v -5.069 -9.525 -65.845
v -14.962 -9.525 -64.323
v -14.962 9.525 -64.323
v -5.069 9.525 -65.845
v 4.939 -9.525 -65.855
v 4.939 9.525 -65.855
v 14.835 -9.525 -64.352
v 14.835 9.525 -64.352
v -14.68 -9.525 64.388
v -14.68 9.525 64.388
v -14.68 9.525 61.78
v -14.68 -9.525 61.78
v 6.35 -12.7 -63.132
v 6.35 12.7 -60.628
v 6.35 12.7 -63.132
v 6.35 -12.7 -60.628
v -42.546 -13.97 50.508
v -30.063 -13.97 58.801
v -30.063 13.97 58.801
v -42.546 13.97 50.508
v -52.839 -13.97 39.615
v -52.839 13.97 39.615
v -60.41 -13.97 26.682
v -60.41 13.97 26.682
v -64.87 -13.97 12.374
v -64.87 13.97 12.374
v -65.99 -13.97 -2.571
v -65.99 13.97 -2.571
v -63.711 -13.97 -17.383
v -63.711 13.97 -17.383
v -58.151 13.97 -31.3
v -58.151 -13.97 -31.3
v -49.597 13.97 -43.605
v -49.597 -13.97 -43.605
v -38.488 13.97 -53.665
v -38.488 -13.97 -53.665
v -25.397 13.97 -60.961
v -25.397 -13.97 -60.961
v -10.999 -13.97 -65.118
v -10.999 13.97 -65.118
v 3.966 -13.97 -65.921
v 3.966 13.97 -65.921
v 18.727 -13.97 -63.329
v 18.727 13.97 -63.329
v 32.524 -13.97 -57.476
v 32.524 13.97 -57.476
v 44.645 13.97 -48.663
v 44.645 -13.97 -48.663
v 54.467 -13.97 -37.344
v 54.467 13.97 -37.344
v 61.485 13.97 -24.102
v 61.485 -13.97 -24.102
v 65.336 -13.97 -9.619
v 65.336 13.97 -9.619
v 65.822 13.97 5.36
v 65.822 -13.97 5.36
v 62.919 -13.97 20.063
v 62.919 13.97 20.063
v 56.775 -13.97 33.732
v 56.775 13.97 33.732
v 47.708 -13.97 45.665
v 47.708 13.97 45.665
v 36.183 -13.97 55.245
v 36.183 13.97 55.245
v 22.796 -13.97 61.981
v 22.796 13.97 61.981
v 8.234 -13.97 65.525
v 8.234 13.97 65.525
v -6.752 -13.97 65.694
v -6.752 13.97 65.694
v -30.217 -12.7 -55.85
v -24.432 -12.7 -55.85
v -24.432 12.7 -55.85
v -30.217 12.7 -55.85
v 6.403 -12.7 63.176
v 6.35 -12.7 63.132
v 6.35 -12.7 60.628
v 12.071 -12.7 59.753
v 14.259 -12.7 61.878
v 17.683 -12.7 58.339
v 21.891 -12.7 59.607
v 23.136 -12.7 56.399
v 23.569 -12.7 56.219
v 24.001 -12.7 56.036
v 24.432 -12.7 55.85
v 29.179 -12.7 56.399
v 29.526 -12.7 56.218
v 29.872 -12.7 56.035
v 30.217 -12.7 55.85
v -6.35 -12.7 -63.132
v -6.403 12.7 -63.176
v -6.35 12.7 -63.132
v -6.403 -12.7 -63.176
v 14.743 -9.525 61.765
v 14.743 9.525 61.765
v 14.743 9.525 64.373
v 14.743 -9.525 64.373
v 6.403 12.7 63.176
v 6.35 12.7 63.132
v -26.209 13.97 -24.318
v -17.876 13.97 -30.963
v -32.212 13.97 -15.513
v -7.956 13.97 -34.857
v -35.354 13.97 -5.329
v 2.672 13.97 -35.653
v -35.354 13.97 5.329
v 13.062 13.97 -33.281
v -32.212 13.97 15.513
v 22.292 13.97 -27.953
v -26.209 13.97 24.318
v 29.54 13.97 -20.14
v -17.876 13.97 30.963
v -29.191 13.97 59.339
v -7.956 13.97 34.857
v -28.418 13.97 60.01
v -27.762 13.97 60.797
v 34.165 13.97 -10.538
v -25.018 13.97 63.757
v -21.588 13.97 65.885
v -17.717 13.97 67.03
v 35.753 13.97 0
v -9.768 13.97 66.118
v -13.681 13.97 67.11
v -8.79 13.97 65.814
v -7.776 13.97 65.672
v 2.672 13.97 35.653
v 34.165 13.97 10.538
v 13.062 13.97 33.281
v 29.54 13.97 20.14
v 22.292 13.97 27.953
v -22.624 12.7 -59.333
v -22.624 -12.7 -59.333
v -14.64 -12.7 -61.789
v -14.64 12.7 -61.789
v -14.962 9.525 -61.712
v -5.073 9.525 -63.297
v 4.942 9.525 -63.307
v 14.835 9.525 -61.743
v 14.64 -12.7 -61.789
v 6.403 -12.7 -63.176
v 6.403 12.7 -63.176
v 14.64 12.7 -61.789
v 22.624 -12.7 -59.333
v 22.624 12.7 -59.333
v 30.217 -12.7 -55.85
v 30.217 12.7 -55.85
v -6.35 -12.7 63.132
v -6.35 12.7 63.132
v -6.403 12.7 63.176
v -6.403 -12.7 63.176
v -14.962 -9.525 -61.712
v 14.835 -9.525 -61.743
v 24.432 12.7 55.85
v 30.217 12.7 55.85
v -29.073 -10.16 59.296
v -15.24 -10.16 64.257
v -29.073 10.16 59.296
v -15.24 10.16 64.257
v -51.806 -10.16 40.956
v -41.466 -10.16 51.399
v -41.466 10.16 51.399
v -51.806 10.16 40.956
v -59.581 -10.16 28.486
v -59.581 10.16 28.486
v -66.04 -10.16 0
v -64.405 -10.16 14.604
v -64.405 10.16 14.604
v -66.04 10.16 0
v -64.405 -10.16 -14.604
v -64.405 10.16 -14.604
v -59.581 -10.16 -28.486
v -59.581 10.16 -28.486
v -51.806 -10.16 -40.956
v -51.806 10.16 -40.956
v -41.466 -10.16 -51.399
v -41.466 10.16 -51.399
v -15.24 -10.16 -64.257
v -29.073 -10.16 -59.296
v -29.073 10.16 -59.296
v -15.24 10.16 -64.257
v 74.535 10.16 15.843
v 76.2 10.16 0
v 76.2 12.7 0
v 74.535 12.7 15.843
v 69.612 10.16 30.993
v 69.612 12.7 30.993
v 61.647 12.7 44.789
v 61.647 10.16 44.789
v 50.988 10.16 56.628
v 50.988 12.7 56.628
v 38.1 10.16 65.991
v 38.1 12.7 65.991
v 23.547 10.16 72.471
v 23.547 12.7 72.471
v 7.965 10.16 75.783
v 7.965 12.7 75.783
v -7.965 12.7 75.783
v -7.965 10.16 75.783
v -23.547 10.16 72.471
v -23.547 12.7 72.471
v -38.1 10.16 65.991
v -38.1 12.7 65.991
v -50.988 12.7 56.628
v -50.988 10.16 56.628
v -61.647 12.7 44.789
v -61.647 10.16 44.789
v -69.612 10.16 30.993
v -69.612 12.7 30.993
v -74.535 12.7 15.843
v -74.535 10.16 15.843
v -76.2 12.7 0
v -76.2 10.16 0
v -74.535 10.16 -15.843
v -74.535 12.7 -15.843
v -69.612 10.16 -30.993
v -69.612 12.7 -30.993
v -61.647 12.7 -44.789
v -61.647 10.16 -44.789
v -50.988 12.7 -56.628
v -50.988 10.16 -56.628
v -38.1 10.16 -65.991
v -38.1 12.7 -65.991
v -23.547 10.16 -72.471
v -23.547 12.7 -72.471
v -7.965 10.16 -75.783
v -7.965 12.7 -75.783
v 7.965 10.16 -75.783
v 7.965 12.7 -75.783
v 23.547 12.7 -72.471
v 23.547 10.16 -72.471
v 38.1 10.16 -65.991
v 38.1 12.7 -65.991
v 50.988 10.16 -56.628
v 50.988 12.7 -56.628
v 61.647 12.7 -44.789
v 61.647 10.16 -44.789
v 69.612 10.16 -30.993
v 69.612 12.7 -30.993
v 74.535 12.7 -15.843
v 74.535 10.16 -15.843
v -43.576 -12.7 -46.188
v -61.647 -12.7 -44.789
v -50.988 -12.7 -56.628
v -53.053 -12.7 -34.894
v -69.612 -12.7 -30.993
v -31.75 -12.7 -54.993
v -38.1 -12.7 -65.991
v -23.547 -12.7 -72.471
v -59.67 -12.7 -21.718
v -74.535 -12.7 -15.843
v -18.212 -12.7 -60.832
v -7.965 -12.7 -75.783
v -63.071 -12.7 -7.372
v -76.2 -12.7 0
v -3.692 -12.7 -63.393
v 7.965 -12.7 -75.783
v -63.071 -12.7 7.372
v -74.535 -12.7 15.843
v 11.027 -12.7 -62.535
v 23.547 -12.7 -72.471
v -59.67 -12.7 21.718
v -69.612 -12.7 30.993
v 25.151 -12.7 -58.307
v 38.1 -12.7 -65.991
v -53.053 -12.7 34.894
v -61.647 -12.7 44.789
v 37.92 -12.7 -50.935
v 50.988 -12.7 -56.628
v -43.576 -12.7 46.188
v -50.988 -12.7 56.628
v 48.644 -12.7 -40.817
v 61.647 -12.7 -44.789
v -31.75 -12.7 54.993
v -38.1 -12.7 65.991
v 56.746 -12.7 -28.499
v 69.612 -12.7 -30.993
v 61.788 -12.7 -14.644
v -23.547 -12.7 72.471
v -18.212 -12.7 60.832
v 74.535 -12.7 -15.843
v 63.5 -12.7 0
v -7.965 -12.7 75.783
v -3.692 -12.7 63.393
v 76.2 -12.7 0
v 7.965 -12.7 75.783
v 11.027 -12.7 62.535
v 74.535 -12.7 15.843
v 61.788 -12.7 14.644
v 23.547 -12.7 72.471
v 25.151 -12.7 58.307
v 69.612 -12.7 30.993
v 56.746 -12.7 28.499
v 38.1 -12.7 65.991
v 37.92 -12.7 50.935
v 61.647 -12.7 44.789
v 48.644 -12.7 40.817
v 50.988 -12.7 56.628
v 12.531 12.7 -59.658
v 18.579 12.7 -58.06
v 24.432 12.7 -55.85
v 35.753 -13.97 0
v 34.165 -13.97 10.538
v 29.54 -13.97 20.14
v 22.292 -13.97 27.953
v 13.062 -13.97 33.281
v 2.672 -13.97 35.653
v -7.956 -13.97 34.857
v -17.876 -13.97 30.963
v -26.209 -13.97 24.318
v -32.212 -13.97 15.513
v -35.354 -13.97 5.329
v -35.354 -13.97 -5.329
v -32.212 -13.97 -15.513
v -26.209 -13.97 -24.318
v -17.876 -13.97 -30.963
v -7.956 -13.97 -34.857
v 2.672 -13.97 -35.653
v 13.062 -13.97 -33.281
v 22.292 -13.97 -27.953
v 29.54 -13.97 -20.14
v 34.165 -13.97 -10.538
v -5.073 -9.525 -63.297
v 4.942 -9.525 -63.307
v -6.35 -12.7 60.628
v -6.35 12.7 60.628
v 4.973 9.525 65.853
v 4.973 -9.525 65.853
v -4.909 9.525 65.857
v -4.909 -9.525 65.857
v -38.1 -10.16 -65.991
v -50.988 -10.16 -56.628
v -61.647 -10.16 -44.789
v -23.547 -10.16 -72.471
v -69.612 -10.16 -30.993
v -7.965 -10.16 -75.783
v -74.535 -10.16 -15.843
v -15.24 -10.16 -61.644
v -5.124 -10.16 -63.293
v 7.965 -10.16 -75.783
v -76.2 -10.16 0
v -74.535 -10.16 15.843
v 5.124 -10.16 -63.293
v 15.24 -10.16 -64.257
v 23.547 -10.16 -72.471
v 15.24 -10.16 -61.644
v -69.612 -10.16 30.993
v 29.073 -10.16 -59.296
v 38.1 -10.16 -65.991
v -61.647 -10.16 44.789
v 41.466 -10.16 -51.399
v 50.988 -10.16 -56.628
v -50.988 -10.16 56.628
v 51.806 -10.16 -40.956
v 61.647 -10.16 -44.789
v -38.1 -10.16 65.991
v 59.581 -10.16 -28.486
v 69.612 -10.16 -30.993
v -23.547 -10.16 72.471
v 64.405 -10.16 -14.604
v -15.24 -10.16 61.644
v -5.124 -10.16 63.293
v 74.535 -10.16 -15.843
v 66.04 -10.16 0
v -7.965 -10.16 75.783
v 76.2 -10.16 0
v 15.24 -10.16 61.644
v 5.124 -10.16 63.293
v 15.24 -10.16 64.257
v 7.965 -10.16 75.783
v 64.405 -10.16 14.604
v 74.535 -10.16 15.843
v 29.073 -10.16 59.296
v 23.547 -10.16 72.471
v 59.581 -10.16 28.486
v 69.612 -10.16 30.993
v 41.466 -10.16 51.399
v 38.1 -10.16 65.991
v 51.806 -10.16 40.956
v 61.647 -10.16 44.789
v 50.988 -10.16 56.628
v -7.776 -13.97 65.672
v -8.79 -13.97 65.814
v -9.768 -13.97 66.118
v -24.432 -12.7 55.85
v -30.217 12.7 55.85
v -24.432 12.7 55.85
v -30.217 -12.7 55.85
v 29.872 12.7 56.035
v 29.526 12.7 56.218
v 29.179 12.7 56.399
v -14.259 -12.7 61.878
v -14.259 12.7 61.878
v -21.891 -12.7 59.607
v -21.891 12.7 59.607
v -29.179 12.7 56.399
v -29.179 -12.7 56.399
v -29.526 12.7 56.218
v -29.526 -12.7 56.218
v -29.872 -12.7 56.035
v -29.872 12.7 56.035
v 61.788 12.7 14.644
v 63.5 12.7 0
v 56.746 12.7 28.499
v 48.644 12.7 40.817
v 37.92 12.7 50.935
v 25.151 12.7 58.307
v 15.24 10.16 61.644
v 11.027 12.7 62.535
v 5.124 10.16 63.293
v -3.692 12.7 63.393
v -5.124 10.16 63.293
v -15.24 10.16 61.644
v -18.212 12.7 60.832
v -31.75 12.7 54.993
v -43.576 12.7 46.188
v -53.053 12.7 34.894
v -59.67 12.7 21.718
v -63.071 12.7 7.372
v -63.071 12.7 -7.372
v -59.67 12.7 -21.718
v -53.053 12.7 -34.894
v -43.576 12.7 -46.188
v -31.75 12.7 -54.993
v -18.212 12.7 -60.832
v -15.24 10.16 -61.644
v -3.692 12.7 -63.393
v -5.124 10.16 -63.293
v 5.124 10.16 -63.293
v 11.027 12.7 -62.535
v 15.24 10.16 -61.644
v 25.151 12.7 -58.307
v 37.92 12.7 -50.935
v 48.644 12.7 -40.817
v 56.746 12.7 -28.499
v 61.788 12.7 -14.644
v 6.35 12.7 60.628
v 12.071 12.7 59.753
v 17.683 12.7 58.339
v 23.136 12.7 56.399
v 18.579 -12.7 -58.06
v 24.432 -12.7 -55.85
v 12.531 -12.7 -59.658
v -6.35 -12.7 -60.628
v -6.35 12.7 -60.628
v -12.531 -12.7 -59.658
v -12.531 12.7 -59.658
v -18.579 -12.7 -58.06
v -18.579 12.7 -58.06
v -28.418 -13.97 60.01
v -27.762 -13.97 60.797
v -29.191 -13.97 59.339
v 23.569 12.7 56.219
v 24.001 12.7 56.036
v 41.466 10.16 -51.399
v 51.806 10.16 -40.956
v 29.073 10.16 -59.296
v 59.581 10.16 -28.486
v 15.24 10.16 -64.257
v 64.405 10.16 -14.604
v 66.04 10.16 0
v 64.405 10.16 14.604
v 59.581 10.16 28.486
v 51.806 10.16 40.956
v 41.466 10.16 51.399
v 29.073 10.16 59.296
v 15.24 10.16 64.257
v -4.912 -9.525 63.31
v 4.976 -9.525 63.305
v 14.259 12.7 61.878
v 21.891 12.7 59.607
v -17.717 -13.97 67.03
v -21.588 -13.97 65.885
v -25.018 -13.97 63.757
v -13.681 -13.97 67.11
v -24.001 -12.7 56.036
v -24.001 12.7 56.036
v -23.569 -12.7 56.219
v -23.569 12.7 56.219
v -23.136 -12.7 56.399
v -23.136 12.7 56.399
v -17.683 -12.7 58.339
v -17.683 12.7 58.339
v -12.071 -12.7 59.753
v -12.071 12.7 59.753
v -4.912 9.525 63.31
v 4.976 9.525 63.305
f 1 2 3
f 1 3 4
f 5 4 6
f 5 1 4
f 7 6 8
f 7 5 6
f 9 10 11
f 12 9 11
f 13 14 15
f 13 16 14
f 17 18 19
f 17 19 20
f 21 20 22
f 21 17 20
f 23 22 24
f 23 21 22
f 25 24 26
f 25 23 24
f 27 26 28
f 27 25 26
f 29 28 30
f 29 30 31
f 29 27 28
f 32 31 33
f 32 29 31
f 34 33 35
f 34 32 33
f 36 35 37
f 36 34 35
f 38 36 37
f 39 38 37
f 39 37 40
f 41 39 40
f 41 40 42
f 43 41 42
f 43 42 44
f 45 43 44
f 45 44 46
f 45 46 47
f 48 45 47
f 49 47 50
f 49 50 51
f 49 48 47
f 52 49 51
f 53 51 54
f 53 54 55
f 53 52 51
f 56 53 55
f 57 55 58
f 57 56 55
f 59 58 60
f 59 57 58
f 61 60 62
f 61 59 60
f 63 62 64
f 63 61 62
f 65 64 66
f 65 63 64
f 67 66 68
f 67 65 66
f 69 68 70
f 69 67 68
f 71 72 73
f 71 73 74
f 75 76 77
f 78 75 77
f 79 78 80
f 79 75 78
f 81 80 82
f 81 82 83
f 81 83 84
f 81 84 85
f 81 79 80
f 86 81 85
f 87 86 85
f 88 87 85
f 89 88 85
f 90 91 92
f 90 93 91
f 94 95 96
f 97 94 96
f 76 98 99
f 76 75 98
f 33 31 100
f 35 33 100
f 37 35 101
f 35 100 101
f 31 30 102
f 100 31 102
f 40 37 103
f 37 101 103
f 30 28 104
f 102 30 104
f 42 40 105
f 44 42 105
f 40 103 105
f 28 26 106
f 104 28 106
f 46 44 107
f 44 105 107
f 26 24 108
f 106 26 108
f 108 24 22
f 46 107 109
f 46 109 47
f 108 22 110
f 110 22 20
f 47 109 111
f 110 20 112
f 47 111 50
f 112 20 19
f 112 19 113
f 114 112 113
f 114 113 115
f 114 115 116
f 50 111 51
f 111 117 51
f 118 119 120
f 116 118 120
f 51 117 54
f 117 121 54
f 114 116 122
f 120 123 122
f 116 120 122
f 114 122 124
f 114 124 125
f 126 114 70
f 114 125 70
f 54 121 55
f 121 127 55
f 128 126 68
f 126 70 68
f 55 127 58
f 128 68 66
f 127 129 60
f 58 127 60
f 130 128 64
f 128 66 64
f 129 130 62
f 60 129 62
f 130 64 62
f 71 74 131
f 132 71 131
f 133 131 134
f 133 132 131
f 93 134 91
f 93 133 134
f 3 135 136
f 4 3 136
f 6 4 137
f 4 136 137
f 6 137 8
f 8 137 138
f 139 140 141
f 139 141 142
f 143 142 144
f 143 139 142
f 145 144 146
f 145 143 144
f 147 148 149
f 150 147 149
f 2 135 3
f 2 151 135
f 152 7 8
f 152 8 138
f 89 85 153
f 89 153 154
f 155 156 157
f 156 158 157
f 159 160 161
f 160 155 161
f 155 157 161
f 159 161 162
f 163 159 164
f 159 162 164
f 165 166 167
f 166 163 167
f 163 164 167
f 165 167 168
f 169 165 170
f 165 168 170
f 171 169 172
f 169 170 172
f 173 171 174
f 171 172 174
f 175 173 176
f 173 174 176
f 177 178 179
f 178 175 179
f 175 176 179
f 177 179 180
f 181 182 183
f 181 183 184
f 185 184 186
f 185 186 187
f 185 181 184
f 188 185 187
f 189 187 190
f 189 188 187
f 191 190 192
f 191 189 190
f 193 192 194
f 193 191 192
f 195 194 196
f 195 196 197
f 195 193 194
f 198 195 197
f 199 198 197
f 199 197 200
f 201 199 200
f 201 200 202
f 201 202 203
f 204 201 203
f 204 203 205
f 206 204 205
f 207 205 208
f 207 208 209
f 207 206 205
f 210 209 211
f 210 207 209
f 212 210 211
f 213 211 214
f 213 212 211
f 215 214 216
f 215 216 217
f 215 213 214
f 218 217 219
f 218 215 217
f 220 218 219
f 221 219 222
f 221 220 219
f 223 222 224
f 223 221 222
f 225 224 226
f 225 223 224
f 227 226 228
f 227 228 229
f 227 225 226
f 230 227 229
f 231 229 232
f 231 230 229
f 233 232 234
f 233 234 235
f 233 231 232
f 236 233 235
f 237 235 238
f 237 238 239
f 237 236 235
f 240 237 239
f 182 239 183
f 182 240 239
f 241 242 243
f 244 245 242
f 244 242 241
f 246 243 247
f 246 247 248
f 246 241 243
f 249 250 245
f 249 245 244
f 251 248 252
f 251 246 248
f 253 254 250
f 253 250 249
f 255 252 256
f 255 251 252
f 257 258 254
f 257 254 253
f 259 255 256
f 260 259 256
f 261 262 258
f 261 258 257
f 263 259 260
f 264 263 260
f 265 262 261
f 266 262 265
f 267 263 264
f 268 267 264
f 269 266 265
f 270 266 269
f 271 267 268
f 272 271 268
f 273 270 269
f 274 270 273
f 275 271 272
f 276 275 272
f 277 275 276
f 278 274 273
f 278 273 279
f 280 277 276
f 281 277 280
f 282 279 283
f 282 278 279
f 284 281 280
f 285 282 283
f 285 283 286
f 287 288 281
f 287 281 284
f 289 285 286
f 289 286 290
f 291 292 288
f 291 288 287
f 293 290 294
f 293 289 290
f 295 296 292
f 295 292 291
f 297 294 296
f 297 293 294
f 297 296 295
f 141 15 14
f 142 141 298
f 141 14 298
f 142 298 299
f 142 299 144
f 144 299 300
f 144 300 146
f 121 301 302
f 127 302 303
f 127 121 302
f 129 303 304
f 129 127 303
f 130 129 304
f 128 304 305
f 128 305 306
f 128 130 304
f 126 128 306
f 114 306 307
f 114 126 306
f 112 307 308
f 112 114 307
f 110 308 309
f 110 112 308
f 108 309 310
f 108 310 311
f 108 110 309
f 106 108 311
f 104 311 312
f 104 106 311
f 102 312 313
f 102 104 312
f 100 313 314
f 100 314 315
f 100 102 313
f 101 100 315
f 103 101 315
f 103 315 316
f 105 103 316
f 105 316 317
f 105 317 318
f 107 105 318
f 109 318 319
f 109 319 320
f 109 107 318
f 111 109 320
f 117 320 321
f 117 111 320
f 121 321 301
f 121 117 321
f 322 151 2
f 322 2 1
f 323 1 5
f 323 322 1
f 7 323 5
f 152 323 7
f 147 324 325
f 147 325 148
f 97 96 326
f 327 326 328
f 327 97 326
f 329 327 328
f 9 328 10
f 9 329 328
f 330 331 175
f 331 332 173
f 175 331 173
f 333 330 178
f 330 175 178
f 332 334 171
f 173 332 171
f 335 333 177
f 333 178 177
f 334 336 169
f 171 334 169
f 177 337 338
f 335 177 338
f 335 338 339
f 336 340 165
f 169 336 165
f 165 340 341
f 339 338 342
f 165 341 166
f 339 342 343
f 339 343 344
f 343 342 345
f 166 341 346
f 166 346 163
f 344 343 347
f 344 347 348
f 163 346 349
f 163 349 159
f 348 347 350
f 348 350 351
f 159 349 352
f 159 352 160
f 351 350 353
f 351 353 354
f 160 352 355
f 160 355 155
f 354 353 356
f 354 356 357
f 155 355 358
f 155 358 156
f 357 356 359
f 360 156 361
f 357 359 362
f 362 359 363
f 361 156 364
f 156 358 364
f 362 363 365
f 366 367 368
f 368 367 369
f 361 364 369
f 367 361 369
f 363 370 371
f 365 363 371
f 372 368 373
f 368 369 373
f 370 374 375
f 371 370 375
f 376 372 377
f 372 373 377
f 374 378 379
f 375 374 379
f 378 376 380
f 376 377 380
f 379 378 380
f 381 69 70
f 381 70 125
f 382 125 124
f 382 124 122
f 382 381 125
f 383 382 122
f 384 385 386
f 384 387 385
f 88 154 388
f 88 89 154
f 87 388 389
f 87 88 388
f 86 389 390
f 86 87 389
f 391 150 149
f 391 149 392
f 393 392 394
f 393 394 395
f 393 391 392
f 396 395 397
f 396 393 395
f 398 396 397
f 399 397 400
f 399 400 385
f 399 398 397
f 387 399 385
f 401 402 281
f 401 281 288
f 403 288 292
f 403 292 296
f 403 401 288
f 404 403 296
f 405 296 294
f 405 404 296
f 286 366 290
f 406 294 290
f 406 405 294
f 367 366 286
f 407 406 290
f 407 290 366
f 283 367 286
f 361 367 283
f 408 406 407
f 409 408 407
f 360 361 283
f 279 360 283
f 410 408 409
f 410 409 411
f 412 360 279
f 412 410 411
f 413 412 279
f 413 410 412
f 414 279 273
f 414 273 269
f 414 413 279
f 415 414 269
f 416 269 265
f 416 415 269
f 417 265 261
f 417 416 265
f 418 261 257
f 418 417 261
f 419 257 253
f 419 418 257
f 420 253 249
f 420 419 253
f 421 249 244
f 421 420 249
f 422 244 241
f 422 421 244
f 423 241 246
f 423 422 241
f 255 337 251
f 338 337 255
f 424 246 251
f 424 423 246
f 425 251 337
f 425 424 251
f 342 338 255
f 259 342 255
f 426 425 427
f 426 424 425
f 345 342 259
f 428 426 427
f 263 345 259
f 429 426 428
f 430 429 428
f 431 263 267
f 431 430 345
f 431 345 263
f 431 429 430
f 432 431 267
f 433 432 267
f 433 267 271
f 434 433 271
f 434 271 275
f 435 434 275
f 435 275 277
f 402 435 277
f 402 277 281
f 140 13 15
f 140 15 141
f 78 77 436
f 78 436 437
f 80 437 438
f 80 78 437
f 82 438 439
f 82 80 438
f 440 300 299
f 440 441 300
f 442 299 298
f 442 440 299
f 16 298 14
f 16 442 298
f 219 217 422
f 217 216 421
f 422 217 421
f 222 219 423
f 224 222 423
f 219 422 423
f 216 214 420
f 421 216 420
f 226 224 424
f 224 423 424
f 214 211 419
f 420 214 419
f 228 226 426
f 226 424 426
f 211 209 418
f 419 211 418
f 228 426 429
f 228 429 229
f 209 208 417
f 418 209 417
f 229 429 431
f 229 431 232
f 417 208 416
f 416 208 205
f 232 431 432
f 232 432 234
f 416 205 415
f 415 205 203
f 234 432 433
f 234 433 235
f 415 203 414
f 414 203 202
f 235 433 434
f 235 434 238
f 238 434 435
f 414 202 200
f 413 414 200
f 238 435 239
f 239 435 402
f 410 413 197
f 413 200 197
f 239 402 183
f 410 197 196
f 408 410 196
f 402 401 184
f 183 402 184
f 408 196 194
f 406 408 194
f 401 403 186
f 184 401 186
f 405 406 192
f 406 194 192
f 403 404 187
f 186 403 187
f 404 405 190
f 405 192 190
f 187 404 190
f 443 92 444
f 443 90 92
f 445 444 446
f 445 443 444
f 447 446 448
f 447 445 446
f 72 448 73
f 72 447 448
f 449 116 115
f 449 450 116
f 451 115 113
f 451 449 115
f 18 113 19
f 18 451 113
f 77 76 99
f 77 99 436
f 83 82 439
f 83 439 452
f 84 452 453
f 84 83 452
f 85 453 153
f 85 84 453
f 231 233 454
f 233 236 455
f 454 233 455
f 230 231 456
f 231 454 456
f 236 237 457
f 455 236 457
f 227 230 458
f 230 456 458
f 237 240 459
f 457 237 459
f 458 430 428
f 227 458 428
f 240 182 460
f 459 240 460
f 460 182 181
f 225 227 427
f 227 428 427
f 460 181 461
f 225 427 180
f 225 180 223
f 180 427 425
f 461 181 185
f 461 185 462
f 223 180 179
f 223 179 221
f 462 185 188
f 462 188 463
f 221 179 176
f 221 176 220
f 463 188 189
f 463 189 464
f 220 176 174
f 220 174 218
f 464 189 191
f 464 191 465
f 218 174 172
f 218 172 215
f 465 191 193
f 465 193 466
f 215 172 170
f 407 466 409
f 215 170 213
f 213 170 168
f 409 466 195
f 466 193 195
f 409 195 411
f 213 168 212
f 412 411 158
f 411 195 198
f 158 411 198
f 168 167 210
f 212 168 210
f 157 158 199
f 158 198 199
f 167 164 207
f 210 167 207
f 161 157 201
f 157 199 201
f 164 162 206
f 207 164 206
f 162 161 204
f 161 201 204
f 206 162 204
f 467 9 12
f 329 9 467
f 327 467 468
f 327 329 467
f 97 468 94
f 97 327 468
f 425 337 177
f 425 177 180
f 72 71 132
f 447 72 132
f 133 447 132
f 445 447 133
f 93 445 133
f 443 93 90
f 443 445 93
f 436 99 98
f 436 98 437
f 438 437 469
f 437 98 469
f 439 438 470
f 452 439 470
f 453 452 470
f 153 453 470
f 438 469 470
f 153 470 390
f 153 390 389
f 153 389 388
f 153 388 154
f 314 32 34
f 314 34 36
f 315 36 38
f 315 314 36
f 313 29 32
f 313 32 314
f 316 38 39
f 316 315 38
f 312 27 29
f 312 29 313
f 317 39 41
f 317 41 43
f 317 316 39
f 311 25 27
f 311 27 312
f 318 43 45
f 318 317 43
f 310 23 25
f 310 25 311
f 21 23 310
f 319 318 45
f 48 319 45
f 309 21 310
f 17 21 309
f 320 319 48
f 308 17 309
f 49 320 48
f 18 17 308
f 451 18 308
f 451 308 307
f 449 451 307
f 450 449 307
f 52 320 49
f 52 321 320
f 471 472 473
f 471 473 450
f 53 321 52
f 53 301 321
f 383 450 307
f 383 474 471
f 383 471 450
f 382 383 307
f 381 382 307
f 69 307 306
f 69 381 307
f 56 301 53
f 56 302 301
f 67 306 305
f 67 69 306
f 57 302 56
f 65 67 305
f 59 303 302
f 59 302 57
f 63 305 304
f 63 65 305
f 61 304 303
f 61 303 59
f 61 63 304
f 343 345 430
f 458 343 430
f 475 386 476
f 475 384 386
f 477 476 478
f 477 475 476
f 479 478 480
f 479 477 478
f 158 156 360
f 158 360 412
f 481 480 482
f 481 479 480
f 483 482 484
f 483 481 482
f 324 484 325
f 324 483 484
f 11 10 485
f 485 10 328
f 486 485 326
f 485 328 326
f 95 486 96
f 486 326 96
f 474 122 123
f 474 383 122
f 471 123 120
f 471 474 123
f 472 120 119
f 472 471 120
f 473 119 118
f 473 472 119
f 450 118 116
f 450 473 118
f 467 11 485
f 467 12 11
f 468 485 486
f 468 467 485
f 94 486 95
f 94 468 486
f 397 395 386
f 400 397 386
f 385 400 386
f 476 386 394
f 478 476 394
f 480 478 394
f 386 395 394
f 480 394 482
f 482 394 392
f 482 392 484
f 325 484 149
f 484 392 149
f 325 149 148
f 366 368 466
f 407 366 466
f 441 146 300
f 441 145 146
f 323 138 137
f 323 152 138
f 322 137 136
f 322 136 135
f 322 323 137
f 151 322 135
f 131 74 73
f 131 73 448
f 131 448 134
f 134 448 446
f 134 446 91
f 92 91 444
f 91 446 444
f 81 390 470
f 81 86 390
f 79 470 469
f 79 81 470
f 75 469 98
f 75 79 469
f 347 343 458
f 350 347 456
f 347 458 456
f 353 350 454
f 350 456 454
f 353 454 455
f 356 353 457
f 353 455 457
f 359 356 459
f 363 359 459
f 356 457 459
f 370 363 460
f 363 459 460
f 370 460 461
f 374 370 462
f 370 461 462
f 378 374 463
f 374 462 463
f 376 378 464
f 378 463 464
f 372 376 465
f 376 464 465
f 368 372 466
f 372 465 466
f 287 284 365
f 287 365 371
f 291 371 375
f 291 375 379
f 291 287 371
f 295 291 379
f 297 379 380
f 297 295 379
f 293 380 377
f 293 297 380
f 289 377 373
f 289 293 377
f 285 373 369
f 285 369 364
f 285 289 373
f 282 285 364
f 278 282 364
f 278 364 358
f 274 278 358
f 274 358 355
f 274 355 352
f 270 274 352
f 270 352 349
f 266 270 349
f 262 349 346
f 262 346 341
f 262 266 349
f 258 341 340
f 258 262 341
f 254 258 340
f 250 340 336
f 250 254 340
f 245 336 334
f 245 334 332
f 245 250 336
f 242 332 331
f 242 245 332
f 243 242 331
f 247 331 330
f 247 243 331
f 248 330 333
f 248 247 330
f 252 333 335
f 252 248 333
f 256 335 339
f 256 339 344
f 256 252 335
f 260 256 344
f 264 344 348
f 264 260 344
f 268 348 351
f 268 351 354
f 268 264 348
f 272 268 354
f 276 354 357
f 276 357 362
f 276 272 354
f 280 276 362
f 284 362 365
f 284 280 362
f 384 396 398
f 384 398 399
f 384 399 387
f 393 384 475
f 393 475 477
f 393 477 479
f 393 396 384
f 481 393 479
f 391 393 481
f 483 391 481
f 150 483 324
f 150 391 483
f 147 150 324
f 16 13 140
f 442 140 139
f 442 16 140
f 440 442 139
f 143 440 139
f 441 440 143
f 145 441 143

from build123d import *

# Parameters (mm, degrees)
F0_R      = 76.2
F0_R_2    = 63.5
F1_DEPTH  = 12.7
F3_T      = -2.54
F2_W      = 15.24
F2_H      = 20.32
F4_DEPTH  = 66.04
F6_DEPTH  = 9.525
F8_DEPTH  = 12.7
F9_R      = 35.7529089969
F10_DEPTH = 13.97


with BuildPart() as f1:
    # F0 (on Front) → F1 (new body, symmetric)
    with BuildSketch(Plane.XZ):
        Circle(F0_R)
        Circle(F0_R_2, mode=Mode.SUBTRACT)
    extrude(amount=F1_DEPTH, both=True)

    # F3
    f3_openings = [f1.faces().sort_by_distance(p)[0] for p in [
        (-76.2, 0, 0),
    ]]
    offset(amount=F3_T, openings=f3_openings)

    # F2 (on Top) → F4 (cut, symmetric)
    with BuildSketch(Plane.XY):
        with Locations((-7.62, 0)):
            Rectangle(F2_W, F2_H)
        with Locations((7.62, 0)):
            Rectangle(F2_W, F2_H)
    extrude(amount=F4_DEPTH, both=True, mode=Mode.SUBTRACT)


with BuildPart() as f6:
    # F5 (on Front) → F6 (new body, symmetric)
    with BuildSketch(Plane.XZ):
        with BuildLine():
            ThreePointArc((-14.6804592455, 61.7797225337), (0.0322033107, 63.4999918342), (14.7431134689, 61.7648006978))
            Line((14.7431134689, 61.7648006978), (14.7431134689, 64.3733035135))
            ThreePointArc((14.7431134689, 64.3733035135), (0.0321346281, 66.0399921818), (-14.6804592455, 64.3876208315))
            Line((-14.6804592455, 64.3876208315), (-14.6804592455, 61.7797225337))
        make_face()
    extrude(amount=F6_DEPTH, both=True)


with BuildPart() as f6b:
    # F5 (on Front) → F6, piece 2 (new body, symmetric)
    with BuildSketch(Plane.XZ):
        with BuildLine():
            Line((-14.9617508265, -61.7122031061), (-14.9617508265, -64.3228389626))
            ThreePointArc((-14.9617508265, -64.3228389626), (-0.0652215525, -66.0399677934), (14.834670357, -64.3522661248))
            Line((14.834670357, -64.3522661248), (14.834670357, -61.7428745314))
            ThreePointArc((14.834670357, -61.7428745314), (-0.0653647116, -63.4999663579), (-14.9617508265, -61.7122031061))
        make_face()
    extrude(amount=F6_DEPTH, both=True)


with BuildPart() as f8:
    # F7 (on Front) → F8 (new body, symmetric)
    with BuildSketch(Plane.XZ):
        with BuildLine():
            ThreePointArc((-6.35, -60.6283687724), (-15.575286476, -58.9366783183), (-24.431876042, -55.8498436262))
            Line((-24.431876042, -55.8498436262), (-30.2166339444, -55.8498436262))
            ThreePointArc((-30.2166339444, -55.8498436262), (-18.6726647382, -60.6925167675), (-6.4029763415, -63.1763554977))
            Line((-6.4029763415, -63.1763554977), (-6.35, -63.1315240057))
            Line((-6.35, -63.1315240057), (-6.35, -60.6283687724))
        make_face()
    extrude(amount=F8_DEPTH, both=True)


with BuildPart() as f8b:
    # F7 (on Front) → F8, piece 2 (new body, symmetric)
    with BuildSketch(Plane.XZ):
        with BuildLine():
            ThreePointArc((-23.1361730152, 56.3989281654), (-14.8939800501, 59.1125279299), (-6.35, 60.6283687724))
            Line((-6.35, 60.6283687724), (-6.35, 63.1315240057))
            Line((-6.35, 63.1315240057), (-6.4029763415, 63.1763554977))
            ThreePointArc((-6.4029763415, 63.1763554977), (-18.1108167509, 60.8625362322), (-29.1789462077, 56.3989281654))
            Line((-29.1789462077, 56.3989281654), (-23.1361730152, 56.3989281654))
        make_face()
        with BuildLine():
            ThreePointArc((-24.431876042, 55.8498436262), (-23.7856090154, 56.1281248909), (-23.1361730152, 56.3989281654))
            Line((-23.1361730152, 56.3989281654), (-29.1789462077, 56.3989281654))
            ThreePointArc((-29.1789462077, 56.3989281654), (-29.6990590568, 56.1267840798), (-30.2166339444, 55.8498436262))
            Line((-30.2166339444, 55.8498436262), (-24.431876042, 55.8498436262))
        make_face()
    extrude(amount=F8_DEPTH, both=True)


with BuildPart() as f8c:
    # F7 (on Front) → F8, piece 3 (new body, symmetric)
    with BuildSketch(Plane.XZ):
        with BuildLine():
            Line((6.4029763415, 63.1763554977), (6.35, 63.1315240057))
            Line((6.35, 63.1315240057), (6.35, 60.6283687724))
            ThreePointArc((6.35, 60.6283687724), (14.8939800501, 59.1125279299), (23.1361730152, 56.3989281654))
            Line((23.1361730152, 56.3989281654), (29.1789462077, 56.3989281654))
            ThreePointArc((29.1789462077, 56.3989281654), (18.1108167509, 60.8625362322), (6.4029763415, 63.1763554977))
        make_face()
        with BuildLine():
            Line((29.1789462077, 56.3989281654), (23.1361730152, 56.3989281654))
            ThreePointArc((23.1361730152, 56.3989281654), (23.7856090154, 56.1281248909), (24.431876042, 55.8498436262))
            Line((24.431876042, 55.8498436262), (30.2166339444, 55.8498436262))
            ThreePointArc((30.2166339444, 55.8498436262), (29.6990590568, 56.1267840798), (29.1789462077, 56.3989281654))
        make_face()
    extrude(amount=F8_DEPTH, both=True)


with BuildPart() as f8d:
    # F7 (on Front) → F8, piece 4 (new body, symmetric)
    with BuildSketch(Plane.XZ):
        with BuildLine():
            Line((6.35, -60.6283687724), (6.35, -63.1315240057))
            Line((6.35, -63.1315240057), (6.4029763415, -63.1763554977))
            ThreePointArc((6.4029763415, -63.1763554977), (18.6726647382, -60.6925167675), (30.2166339444, -55.8498436262))
            Line((30.2166339444, -55.8498436262), (24.431876042, -55.8498436262))
            ThreePointArc((24.431876042, -55.8498436262), (15.575286476, -58.9366783183), (6.35, -60.6283687724))
        make_face()
    extrude(amount=F8_DEPTH, both=True)


with BuildPart() as f10:
    # F9 (on Front) → F10 (new body, symmetric)
    with BuildSketch(Plane.XZ):
        with BuildLine():
            ThreePointArc((-27.7623035615, 60.7972821317), (-28.791005851, 59.6589857347), (-30.0626969544, 58.800644995))
            ThreePointArc((-30.0626969544, 58.800644995), (18.7271235897, -63.3291121212), (-6.7517421176, 65.6939538951))
            ThreePointArc((-6.7517421176, 65.6939538951), (-8.2857320593, 65.7226235101), (-9.7680700784, 66.1183773288))
            ThreePointArc((-9.7680700784, 66.1183773288), (-19.6906568062, 66.5874717303), (-27.7623035615, 60.7972821317))
        make_face()
        Circle(F9_R, mode=Mode.SUBTRACT)
    extrude(amount=F10_DEPTH, both=True)


solid = Compound([f1.part, f6.part, f6b.part, f8.part, f8b.part, f8c.part, f8d.part, f10.part])
